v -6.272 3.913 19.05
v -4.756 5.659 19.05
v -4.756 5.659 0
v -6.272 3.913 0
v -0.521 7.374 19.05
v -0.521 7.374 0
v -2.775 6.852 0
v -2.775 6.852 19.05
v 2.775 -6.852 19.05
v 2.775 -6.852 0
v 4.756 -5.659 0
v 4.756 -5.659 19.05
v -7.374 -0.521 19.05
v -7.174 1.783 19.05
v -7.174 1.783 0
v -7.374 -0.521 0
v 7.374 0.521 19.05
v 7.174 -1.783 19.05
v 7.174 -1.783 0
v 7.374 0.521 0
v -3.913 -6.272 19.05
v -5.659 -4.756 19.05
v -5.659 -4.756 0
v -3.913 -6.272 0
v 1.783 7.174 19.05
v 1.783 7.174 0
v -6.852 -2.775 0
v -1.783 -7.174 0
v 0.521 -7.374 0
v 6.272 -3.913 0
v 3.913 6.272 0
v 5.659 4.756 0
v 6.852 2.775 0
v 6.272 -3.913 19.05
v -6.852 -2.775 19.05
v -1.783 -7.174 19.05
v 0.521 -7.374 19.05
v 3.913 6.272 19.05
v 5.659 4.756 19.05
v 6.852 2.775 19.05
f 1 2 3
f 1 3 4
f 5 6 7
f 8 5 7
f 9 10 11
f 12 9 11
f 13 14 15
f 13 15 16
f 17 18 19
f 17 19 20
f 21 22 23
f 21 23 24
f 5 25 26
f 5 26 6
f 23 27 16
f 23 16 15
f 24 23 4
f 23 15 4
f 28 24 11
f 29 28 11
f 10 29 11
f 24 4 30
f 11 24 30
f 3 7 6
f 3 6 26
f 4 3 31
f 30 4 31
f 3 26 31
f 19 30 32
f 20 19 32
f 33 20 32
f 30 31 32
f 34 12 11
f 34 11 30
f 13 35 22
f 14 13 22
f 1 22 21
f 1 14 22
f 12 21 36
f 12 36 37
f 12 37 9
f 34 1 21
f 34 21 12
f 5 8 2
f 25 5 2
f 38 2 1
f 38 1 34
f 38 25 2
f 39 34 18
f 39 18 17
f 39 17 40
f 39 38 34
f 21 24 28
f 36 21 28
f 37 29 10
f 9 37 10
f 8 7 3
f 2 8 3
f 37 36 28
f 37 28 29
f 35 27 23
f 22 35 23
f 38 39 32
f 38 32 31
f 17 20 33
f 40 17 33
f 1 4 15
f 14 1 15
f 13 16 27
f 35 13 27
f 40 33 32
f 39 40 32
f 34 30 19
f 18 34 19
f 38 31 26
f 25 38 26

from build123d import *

# Parameters (mm, degrees)
F1_DEPTH = 19.05


with BuildPart() as f1:
    # F0 (on Top) → F1 (new body)
    with BuildSketch(Plane.XY):
        Polygon((5.659421, 4.75631), (3.912648, 6.272377), (1.782879, 7.17446), (-0.521412, 7.374257), (-2.774663, 6.85221), (-4.75631, 5.659421), (-6.272377, 3.912648), (-7.17446, 1.782879), (-7.374257, -0.521412), (-6.85221, -2.774663), (-5.659421, -4.75631), (-3.912648, -6.272377), (-1.782879, -7.17446), (0.521412, -7.374257), (2.774663, -6.85221), (4.75631, -5.659421), (6.272377, -3.912648), (7.17446, -1.782879), (7.374257, 0.521412), (6.85221, 2.774663), align=None)
    extrude(amount=F1_DEPTH)


solid = f1.part
